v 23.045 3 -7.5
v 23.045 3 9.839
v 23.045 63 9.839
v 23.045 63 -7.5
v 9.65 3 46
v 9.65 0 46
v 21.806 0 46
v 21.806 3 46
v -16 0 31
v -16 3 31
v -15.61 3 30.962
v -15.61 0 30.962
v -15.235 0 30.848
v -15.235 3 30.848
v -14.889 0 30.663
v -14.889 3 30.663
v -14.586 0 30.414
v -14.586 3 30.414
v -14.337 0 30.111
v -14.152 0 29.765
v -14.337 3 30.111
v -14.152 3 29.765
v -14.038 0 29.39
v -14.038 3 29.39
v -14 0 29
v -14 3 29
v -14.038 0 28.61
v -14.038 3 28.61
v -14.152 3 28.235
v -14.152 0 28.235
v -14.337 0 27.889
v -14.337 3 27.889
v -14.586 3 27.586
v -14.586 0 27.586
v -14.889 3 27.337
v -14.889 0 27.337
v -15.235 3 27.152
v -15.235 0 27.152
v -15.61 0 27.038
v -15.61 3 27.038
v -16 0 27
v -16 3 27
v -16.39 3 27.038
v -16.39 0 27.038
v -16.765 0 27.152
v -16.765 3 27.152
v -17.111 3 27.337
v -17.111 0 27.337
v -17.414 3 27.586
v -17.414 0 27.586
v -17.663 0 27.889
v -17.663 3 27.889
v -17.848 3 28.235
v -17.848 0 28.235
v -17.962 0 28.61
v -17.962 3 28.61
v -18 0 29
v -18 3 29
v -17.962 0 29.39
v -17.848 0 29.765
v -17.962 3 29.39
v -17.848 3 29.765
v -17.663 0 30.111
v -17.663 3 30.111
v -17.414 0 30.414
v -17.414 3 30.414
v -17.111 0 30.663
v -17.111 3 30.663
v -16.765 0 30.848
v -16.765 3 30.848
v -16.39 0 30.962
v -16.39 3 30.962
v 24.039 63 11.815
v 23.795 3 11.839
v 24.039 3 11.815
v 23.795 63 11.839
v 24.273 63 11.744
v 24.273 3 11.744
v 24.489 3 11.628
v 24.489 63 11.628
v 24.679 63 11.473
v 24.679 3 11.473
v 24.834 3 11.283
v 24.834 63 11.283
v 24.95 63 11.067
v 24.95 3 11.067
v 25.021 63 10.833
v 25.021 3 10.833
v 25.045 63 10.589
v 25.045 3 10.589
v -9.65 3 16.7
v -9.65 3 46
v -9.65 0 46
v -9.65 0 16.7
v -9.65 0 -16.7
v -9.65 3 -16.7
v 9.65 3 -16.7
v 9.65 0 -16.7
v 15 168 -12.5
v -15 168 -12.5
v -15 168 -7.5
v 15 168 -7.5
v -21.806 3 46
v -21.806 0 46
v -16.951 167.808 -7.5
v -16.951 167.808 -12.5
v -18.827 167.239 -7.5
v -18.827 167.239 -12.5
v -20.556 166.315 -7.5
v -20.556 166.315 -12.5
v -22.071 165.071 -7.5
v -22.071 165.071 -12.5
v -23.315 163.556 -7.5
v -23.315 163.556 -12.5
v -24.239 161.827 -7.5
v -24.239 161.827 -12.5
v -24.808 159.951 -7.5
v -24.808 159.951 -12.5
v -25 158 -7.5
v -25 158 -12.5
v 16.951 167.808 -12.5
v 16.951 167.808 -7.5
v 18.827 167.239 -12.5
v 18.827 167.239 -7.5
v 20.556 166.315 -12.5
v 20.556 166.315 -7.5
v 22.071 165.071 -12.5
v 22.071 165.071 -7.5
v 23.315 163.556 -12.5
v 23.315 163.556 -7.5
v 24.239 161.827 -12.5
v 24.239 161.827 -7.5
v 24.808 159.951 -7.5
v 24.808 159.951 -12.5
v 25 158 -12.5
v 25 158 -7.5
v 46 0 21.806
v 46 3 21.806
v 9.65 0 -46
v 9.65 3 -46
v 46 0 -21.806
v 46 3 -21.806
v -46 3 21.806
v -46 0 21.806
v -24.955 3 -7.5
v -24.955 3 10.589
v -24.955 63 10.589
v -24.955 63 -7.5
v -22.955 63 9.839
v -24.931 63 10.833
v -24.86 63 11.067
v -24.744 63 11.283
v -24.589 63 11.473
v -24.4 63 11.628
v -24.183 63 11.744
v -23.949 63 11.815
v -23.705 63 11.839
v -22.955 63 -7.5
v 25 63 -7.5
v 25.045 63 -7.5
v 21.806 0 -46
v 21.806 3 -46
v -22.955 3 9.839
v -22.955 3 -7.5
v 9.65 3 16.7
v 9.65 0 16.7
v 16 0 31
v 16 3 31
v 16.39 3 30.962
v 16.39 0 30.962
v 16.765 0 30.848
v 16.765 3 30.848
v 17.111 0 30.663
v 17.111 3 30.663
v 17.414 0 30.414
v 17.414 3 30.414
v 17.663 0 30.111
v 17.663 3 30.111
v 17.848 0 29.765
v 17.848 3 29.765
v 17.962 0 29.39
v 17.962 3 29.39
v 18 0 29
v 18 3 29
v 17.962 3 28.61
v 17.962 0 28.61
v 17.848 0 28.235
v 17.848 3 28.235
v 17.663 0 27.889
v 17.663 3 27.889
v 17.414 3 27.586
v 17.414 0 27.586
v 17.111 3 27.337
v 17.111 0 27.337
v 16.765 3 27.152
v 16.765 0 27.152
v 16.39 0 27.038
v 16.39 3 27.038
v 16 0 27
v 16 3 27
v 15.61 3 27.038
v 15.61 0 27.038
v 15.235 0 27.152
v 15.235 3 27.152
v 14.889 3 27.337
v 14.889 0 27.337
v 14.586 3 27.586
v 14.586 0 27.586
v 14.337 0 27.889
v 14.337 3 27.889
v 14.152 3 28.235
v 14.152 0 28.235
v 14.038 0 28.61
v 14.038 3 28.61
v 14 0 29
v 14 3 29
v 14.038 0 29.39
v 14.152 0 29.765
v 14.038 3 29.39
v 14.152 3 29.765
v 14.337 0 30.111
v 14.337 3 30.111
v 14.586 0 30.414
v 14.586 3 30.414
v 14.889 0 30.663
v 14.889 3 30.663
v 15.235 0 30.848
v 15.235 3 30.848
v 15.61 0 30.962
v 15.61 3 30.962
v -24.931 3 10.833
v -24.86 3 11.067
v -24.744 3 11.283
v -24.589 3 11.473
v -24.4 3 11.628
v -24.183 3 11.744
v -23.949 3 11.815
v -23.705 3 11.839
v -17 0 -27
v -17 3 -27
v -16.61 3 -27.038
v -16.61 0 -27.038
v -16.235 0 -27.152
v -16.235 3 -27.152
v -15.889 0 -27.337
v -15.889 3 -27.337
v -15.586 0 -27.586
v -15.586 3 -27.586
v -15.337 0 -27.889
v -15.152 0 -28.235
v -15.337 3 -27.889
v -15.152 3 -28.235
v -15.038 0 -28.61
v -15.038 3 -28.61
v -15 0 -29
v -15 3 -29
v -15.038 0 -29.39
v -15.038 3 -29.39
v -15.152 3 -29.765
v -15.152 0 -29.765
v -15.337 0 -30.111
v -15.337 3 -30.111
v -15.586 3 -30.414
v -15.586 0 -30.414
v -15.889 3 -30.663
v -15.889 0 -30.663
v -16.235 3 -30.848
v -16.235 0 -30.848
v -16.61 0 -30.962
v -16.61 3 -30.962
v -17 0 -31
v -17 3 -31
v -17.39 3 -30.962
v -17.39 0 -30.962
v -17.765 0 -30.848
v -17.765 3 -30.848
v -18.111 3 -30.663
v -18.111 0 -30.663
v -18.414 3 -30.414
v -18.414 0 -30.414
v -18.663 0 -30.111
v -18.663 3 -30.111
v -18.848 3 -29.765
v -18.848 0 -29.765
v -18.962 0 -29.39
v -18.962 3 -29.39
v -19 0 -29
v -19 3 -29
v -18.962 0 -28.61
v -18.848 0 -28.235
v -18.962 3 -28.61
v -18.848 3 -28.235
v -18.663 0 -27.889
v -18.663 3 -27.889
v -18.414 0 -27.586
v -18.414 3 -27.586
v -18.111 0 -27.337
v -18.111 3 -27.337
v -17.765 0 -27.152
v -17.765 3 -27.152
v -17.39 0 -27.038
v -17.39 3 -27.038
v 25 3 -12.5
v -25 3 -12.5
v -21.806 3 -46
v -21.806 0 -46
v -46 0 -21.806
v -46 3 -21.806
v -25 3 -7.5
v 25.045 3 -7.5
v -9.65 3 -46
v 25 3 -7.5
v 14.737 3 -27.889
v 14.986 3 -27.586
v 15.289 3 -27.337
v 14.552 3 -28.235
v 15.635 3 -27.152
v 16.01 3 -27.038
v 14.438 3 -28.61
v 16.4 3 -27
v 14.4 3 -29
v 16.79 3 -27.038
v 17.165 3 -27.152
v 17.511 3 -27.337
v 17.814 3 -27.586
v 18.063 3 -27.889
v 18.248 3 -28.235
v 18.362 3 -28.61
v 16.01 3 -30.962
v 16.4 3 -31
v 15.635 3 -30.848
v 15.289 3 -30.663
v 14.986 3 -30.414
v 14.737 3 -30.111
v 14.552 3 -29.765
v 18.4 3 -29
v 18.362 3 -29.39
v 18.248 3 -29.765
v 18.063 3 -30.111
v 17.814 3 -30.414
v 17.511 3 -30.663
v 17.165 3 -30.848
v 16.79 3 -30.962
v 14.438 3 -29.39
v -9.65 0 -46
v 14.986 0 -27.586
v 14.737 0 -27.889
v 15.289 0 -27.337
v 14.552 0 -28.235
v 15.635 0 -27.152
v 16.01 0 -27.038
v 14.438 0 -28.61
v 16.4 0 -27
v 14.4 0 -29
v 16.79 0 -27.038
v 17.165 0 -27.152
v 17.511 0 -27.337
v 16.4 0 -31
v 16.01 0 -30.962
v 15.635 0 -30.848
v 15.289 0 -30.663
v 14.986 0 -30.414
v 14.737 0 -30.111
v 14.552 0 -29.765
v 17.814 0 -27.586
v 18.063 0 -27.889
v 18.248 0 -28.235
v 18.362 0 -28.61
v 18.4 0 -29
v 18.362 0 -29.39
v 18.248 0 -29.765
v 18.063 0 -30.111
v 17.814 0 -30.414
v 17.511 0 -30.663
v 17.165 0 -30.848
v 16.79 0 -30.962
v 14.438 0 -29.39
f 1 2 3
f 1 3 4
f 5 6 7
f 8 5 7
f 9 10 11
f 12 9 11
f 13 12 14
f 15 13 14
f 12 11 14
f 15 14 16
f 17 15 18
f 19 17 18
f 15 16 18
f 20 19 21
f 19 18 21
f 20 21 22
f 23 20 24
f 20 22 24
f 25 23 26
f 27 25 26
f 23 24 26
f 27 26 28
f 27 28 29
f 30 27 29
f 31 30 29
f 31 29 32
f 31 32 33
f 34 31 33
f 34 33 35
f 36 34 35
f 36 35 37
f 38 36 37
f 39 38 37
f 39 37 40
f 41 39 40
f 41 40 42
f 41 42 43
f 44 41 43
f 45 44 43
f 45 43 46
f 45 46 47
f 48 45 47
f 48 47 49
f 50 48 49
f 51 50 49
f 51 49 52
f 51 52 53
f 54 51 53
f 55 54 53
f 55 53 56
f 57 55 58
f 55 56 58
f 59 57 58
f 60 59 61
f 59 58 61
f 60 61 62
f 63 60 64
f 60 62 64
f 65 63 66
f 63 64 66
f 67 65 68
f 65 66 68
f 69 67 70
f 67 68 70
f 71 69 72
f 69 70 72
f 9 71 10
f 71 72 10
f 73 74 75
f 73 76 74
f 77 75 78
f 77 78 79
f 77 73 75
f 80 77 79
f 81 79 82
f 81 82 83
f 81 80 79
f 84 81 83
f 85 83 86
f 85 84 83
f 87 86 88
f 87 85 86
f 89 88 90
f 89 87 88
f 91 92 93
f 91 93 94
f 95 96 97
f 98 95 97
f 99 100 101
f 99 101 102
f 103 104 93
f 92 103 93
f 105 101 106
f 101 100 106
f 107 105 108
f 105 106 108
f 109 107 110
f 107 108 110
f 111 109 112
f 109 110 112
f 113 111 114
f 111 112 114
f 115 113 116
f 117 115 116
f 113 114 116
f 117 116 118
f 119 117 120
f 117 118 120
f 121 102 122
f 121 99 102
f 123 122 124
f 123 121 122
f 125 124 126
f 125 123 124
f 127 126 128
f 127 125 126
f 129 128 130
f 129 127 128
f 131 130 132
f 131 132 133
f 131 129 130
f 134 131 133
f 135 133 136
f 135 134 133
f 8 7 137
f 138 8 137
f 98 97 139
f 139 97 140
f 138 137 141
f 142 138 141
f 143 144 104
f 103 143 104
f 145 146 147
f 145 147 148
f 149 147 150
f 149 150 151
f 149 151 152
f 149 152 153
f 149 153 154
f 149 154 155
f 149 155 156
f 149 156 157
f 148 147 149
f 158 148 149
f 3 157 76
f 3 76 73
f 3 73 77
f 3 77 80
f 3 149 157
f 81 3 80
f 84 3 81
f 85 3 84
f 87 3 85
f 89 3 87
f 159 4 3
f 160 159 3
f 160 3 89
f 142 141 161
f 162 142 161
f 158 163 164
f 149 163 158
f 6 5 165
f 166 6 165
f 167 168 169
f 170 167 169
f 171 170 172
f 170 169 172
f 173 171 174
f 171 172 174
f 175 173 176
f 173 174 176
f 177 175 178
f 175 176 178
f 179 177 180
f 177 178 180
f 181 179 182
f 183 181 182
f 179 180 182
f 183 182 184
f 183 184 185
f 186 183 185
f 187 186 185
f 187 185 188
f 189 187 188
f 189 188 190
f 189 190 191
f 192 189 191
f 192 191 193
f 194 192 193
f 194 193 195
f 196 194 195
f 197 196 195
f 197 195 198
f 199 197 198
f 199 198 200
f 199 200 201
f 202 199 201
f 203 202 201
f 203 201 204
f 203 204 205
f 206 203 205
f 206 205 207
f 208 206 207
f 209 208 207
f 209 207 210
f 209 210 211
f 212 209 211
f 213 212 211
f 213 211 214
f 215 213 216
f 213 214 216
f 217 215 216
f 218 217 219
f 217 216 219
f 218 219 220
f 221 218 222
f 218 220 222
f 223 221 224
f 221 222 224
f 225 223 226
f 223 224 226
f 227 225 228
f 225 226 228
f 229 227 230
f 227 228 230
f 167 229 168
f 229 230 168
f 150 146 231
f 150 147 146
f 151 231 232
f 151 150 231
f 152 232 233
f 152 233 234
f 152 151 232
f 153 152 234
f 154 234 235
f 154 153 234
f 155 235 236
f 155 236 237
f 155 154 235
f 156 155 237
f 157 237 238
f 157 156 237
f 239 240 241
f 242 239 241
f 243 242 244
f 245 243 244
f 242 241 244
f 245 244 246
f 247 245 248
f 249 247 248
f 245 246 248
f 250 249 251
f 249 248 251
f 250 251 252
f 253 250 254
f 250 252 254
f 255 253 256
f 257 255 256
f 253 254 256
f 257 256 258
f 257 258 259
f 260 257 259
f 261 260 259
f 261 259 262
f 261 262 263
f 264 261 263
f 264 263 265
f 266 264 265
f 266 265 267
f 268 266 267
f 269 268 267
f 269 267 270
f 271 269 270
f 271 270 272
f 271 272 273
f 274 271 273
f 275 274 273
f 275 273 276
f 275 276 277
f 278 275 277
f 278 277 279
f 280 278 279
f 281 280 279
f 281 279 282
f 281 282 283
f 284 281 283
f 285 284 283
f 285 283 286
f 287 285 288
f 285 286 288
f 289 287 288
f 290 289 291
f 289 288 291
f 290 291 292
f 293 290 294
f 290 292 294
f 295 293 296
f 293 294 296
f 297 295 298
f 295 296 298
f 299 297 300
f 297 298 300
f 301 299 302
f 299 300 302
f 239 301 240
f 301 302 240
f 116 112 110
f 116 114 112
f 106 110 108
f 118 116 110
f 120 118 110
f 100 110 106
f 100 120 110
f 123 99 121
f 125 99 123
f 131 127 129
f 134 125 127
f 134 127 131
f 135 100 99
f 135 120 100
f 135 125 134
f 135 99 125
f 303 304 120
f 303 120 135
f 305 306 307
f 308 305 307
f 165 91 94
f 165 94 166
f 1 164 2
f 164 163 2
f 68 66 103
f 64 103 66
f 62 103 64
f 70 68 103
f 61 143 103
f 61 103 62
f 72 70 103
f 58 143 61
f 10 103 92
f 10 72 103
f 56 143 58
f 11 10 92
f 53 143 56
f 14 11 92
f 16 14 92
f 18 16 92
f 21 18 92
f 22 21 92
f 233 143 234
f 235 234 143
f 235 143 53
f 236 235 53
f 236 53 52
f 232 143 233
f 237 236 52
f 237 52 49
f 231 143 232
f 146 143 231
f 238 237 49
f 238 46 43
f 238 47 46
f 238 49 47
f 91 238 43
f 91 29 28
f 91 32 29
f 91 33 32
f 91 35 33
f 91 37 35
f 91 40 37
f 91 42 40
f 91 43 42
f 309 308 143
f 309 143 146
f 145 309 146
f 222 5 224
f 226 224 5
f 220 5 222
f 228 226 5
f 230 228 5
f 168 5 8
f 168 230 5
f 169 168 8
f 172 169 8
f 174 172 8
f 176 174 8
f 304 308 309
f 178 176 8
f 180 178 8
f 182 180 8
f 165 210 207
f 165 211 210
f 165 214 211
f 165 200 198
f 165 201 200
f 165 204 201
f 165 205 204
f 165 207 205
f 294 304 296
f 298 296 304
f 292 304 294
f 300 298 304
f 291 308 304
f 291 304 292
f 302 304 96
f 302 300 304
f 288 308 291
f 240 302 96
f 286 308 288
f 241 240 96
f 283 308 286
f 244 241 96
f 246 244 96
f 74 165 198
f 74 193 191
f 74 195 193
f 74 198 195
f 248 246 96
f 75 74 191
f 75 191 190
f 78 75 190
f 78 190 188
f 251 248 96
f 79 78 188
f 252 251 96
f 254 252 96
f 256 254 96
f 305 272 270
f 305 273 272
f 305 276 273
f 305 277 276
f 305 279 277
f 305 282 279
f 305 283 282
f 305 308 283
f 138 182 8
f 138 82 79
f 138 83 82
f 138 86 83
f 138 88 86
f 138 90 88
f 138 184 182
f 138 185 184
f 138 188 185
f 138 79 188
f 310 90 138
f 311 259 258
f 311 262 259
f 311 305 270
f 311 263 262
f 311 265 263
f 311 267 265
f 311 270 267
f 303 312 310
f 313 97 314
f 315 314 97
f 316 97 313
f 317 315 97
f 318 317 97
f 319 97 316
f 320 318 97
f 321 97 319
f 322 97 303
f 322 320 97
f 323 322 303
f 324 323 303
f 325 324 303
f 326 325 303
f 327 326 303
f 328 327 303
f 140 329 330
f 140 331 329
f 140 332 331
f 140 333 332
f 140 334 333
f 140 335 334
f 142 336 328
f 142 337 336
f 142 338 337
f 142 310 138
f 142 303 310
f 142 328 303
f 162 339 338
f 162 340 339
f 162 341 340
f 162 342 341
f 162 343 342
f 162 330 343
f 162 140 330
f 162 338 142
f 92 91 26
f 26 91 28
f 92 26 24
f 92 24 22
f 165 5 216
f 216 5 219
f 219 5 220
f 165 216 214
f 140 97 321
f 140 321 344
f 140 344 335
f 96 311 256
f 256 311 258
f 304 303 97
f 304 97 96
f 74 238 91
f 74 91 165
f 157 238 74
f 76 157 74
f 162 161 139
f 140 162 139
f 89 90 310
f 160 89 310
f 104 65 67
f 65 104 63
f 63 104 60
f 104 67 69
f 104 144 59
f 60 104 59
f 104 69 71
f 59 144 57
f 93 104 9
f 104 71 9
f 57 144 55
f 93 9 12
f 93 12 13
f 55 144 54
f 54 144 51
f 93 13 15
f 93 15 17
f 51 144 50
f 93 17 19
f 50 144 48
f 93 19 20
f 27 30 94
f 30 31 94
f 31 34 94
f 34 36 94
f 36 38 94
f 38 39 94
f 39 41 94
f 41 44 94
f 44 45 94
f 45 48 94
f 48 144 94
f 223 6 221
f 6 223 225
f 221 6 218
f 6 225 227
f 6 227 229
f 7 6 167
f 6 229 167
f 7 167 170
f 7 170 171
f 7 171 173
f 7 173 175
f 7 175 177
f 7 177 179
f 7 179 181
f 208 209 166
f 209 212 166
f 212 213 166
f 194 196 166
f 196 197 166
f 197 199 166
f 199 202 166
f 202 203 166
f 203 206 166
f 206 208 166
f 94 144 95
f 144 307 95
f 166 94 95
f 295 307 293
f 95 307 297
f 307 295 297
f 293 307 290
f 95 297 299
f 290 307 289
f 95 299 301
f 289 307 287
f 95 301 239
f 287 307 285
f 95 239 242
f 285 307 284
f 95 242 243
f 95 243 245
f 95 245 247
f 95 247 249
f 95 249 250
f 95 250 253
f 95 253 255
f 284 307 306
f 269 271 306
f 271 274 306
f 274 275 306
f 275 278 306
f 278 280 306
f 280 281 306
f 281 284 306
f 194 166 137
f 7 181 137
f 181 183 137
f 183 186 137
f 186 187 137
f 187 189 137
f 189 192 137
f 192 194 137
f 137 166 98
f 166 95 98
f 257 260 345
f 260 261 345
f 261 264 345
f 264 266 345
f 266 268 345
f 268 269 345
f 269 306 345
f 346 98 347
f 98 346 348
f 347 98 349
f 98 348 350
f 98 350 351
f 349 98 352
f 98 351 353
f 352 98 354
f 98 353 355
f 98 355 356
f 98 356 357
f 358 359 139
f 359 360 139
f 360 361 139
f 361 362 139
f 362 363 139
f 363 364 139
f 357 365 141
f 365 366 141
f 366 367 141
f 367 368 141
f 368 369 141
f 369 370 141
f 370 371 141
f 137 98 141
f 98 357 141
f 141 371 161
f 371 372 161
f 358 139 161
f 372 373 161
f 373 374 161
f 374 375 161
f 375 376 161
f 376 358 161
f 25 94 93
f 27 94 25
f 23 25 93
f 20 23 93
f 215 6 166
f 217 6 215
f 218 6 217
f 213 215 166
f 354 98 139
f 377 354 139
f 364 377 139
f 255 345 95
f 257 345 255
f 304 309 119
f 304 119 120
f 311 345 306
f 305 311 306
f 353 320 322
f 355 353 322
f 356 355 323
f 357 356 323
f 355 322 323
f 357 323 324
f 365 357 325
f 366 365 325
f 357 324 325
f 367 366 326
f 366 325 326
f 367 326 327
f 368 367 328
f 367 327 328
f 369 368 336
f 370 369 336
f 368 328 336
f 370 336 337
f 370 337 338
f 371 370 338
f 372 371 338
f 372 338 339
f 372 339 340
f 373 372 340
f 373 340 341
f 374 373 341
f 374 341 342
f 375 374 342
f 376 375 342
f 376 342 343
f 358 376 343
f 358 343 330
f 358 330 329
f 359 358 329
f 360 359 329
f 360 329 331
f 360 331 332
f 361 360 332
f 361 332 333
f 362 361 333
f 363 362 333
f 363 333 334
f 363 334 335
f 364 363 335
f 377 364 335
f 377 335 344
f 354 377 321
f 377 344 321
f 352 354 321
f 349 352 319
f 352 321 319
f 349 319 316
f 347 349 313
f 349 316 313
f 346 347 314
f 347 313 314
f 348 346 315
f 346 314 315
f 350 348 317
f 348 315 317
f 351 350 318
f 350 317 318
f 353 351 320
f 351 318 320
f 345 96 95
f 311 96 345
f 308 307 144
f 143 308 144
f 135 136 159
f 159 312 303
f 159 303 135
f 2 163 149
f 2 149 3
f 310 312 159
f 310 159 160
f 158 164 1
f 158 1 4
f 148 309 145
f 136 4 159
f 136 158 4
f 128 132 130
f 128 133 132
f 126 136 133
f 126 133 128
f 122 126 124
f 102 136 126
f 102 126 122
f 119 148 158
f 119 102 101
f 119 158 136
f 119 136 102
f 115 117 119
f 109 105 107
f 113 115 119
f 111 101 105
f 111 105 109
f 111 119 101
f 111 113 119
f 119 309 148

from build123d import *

# Parameters (mm, degrees)
SALIENTE_EXTRUIR1_DEPTH  = 3
CROQUIS2_W               = 50
CROQUIS2_H               = 25
SALIENTE_EXTRUIR2_DEPTH  = 165
CROQUIS5_W               = 20
CROQUIS5_H               = 165
CROQUIS5_W_2             = 1.746423124
CROQUIS5_H_2             = 0.642620727
CORTAR_EXTRUIR2_DEPTH    = 76
REDONDEO1_R              = 10
CROQUIS8_W               = 50
CROQUIS8_H               = 19.339026843
SALIENTE_EXTRUIR10_DEPTH = 60
CROQUIS12_W              = 46
CROQUIS12_H              = 15.339026843
CORTAR_EXTRUIR6_DEPTH    = 60
REDONDEO5_R              = 1.25
CROQUIS15_W              = 46
CROQUIS15_H              = 60
CORTAR_EXTRUIR7_DEPTH    = 2
CROQUIS16_R              = 2
CROQUIS16_W              = 19.3
CROQUIS16_H              = 29.3
CORTAR_EXTRUIR8_DEPTH    = 12


with BuildPart() as part:
    # Croquis1 → Saliente-Extruir1 (new body)
    with BuildSketch(Plane(origin=(0, 0, 0), x_dir=(1, 0, 0), z_dir=(0, 1, 0))):
        Polygon((-46, 21.805695142), (-46, -21.805695142), (-21.805695142, -46), (21.805695142, -46), (46, -21.805695142), (46, 21.805695142), (21.805695142, 46), (-21.805695142, 46), align=None)
    extrude(amount=SALIENTE_EXTRUIR1_DEPTH)

    # Croquis2 → Saliente-Extruir2 (add)
    with BuildSketch(Plane(origin=(0, 3, 0), x_dir=(1, 0, 0), z_dir=(0, 1, 0))):
        Rectangle(CROQUIS2_W, CROQUIS2_H)
    extrude(amount=SALIENTE_EXTRUIR2_DEPTH)

    # Croquis5 → Cortar-Extruir2 (cut)
    with BuildSketch(Plane.ZY.offset(25)):
        with Locations((2.5, 85.5)):
            Rectangle(CROQUIS5_W, CROQUIS5_H)
        with Locations((-13.373211562, 137.85800573)):
            Rectangle(CROQUIS5_W_2, CROQUIS5_H_2)
    extrude(amount=-CORTAR_EXTRUIR2_DEPTH, mode=Mode.SUBTRACT)

    # Redondeo1
    redondeo1_edges = [part.edges().sort_by_distance(p)[0] for p in [
        (-25, 168, -10),
        (25, 168, -10),
    ]]
    fillet(redondeo1_edges, radius=REDONDEO1_R)

    # Croquis8 → Saliente-Extruir10 (add)
    with BuildSketch(Plane(origin=(0, 3, -4.577154817), x_dir=(1, 0, 0), z_dir=(0, 1, 0))):
        with Locations((0.044911917, -6.746668238)):
            Rectangle(CROQUIS8_W, CROQUIS8_H)
    extrude(amount=SALIENTE_EXTRUIR10_DEPTH)

    # Croquis12 → Cortar-Extruir6 (cut)
    with BuildSketch(Plane(origin=(0, 63, 0), x_dir=(1, 0, 0), z_dir=(0, 1, 0))):
        with Locations((0.044911917, -2.169513422)):
            Rectangle(CROQUIS12_W, CROQUIS12_H)
    extrude(amount=-CORTAR_EXTRUIR6_DEPTH, mode=Mode.SUBTRACT)

    # Redondeo5
    redondeo5_edges = [part.edges().sort_by_distance(p)[0] for p in [
        (-24.955088083, 33, 11.839026843),
        (25.044911917, 33, 11.839026843),
    ]]
    fillet(redondeo5_edges, radius=REDONDEO5_R)

    # Croquis15 → Cortar-Extruir7 (cut)
    with BuildSketch(Plane.XY.offset(-5.5)):
        with Locations((0.044911917, 33)):
            Rectangle(CROQUIS15_W, CROQUIS15_H)
    extrude(amount=-CORTAR_EXTRUIR7_DEPTH, mode=Mode.SUBTRACT)

    # Croquis16 → Cortar-Extruir8 (cut)
    with BuildSketch(Plane(origin=(0, 3, 0), x_dir=(1, 0, 0), z_dir=(0, 1, 0))):
        with Locations(Location((-17, 29, 0), (0, 0, 270))):
            Circle(CROQUIS16_R)
        with Locations(Location((16.4, 29, 0), (0, 0, 270))):
            Circle(CROQUIS16_R)
        with Locations(Location((-16, -29, 0), (0, 0, 270))):
            Circle(CROQUIS16_R)
        with Locations(Location((16, -29, 0), (0, 0, 270))):
            Circle(CROQUIS16_R)
        with Locations((0, 31.35)):
            Rectangle(CROQUIS16_W, CROQUIS16_H)
        with Locations((0, -31.35)):
            Rectangle(CROQUIS16_W, CROQUIS16_H)
    extrude(amount=-CORTAR_EXTRUIR8_DEPTH, mode=Mode.SUBTRACT)


solid = part.part
